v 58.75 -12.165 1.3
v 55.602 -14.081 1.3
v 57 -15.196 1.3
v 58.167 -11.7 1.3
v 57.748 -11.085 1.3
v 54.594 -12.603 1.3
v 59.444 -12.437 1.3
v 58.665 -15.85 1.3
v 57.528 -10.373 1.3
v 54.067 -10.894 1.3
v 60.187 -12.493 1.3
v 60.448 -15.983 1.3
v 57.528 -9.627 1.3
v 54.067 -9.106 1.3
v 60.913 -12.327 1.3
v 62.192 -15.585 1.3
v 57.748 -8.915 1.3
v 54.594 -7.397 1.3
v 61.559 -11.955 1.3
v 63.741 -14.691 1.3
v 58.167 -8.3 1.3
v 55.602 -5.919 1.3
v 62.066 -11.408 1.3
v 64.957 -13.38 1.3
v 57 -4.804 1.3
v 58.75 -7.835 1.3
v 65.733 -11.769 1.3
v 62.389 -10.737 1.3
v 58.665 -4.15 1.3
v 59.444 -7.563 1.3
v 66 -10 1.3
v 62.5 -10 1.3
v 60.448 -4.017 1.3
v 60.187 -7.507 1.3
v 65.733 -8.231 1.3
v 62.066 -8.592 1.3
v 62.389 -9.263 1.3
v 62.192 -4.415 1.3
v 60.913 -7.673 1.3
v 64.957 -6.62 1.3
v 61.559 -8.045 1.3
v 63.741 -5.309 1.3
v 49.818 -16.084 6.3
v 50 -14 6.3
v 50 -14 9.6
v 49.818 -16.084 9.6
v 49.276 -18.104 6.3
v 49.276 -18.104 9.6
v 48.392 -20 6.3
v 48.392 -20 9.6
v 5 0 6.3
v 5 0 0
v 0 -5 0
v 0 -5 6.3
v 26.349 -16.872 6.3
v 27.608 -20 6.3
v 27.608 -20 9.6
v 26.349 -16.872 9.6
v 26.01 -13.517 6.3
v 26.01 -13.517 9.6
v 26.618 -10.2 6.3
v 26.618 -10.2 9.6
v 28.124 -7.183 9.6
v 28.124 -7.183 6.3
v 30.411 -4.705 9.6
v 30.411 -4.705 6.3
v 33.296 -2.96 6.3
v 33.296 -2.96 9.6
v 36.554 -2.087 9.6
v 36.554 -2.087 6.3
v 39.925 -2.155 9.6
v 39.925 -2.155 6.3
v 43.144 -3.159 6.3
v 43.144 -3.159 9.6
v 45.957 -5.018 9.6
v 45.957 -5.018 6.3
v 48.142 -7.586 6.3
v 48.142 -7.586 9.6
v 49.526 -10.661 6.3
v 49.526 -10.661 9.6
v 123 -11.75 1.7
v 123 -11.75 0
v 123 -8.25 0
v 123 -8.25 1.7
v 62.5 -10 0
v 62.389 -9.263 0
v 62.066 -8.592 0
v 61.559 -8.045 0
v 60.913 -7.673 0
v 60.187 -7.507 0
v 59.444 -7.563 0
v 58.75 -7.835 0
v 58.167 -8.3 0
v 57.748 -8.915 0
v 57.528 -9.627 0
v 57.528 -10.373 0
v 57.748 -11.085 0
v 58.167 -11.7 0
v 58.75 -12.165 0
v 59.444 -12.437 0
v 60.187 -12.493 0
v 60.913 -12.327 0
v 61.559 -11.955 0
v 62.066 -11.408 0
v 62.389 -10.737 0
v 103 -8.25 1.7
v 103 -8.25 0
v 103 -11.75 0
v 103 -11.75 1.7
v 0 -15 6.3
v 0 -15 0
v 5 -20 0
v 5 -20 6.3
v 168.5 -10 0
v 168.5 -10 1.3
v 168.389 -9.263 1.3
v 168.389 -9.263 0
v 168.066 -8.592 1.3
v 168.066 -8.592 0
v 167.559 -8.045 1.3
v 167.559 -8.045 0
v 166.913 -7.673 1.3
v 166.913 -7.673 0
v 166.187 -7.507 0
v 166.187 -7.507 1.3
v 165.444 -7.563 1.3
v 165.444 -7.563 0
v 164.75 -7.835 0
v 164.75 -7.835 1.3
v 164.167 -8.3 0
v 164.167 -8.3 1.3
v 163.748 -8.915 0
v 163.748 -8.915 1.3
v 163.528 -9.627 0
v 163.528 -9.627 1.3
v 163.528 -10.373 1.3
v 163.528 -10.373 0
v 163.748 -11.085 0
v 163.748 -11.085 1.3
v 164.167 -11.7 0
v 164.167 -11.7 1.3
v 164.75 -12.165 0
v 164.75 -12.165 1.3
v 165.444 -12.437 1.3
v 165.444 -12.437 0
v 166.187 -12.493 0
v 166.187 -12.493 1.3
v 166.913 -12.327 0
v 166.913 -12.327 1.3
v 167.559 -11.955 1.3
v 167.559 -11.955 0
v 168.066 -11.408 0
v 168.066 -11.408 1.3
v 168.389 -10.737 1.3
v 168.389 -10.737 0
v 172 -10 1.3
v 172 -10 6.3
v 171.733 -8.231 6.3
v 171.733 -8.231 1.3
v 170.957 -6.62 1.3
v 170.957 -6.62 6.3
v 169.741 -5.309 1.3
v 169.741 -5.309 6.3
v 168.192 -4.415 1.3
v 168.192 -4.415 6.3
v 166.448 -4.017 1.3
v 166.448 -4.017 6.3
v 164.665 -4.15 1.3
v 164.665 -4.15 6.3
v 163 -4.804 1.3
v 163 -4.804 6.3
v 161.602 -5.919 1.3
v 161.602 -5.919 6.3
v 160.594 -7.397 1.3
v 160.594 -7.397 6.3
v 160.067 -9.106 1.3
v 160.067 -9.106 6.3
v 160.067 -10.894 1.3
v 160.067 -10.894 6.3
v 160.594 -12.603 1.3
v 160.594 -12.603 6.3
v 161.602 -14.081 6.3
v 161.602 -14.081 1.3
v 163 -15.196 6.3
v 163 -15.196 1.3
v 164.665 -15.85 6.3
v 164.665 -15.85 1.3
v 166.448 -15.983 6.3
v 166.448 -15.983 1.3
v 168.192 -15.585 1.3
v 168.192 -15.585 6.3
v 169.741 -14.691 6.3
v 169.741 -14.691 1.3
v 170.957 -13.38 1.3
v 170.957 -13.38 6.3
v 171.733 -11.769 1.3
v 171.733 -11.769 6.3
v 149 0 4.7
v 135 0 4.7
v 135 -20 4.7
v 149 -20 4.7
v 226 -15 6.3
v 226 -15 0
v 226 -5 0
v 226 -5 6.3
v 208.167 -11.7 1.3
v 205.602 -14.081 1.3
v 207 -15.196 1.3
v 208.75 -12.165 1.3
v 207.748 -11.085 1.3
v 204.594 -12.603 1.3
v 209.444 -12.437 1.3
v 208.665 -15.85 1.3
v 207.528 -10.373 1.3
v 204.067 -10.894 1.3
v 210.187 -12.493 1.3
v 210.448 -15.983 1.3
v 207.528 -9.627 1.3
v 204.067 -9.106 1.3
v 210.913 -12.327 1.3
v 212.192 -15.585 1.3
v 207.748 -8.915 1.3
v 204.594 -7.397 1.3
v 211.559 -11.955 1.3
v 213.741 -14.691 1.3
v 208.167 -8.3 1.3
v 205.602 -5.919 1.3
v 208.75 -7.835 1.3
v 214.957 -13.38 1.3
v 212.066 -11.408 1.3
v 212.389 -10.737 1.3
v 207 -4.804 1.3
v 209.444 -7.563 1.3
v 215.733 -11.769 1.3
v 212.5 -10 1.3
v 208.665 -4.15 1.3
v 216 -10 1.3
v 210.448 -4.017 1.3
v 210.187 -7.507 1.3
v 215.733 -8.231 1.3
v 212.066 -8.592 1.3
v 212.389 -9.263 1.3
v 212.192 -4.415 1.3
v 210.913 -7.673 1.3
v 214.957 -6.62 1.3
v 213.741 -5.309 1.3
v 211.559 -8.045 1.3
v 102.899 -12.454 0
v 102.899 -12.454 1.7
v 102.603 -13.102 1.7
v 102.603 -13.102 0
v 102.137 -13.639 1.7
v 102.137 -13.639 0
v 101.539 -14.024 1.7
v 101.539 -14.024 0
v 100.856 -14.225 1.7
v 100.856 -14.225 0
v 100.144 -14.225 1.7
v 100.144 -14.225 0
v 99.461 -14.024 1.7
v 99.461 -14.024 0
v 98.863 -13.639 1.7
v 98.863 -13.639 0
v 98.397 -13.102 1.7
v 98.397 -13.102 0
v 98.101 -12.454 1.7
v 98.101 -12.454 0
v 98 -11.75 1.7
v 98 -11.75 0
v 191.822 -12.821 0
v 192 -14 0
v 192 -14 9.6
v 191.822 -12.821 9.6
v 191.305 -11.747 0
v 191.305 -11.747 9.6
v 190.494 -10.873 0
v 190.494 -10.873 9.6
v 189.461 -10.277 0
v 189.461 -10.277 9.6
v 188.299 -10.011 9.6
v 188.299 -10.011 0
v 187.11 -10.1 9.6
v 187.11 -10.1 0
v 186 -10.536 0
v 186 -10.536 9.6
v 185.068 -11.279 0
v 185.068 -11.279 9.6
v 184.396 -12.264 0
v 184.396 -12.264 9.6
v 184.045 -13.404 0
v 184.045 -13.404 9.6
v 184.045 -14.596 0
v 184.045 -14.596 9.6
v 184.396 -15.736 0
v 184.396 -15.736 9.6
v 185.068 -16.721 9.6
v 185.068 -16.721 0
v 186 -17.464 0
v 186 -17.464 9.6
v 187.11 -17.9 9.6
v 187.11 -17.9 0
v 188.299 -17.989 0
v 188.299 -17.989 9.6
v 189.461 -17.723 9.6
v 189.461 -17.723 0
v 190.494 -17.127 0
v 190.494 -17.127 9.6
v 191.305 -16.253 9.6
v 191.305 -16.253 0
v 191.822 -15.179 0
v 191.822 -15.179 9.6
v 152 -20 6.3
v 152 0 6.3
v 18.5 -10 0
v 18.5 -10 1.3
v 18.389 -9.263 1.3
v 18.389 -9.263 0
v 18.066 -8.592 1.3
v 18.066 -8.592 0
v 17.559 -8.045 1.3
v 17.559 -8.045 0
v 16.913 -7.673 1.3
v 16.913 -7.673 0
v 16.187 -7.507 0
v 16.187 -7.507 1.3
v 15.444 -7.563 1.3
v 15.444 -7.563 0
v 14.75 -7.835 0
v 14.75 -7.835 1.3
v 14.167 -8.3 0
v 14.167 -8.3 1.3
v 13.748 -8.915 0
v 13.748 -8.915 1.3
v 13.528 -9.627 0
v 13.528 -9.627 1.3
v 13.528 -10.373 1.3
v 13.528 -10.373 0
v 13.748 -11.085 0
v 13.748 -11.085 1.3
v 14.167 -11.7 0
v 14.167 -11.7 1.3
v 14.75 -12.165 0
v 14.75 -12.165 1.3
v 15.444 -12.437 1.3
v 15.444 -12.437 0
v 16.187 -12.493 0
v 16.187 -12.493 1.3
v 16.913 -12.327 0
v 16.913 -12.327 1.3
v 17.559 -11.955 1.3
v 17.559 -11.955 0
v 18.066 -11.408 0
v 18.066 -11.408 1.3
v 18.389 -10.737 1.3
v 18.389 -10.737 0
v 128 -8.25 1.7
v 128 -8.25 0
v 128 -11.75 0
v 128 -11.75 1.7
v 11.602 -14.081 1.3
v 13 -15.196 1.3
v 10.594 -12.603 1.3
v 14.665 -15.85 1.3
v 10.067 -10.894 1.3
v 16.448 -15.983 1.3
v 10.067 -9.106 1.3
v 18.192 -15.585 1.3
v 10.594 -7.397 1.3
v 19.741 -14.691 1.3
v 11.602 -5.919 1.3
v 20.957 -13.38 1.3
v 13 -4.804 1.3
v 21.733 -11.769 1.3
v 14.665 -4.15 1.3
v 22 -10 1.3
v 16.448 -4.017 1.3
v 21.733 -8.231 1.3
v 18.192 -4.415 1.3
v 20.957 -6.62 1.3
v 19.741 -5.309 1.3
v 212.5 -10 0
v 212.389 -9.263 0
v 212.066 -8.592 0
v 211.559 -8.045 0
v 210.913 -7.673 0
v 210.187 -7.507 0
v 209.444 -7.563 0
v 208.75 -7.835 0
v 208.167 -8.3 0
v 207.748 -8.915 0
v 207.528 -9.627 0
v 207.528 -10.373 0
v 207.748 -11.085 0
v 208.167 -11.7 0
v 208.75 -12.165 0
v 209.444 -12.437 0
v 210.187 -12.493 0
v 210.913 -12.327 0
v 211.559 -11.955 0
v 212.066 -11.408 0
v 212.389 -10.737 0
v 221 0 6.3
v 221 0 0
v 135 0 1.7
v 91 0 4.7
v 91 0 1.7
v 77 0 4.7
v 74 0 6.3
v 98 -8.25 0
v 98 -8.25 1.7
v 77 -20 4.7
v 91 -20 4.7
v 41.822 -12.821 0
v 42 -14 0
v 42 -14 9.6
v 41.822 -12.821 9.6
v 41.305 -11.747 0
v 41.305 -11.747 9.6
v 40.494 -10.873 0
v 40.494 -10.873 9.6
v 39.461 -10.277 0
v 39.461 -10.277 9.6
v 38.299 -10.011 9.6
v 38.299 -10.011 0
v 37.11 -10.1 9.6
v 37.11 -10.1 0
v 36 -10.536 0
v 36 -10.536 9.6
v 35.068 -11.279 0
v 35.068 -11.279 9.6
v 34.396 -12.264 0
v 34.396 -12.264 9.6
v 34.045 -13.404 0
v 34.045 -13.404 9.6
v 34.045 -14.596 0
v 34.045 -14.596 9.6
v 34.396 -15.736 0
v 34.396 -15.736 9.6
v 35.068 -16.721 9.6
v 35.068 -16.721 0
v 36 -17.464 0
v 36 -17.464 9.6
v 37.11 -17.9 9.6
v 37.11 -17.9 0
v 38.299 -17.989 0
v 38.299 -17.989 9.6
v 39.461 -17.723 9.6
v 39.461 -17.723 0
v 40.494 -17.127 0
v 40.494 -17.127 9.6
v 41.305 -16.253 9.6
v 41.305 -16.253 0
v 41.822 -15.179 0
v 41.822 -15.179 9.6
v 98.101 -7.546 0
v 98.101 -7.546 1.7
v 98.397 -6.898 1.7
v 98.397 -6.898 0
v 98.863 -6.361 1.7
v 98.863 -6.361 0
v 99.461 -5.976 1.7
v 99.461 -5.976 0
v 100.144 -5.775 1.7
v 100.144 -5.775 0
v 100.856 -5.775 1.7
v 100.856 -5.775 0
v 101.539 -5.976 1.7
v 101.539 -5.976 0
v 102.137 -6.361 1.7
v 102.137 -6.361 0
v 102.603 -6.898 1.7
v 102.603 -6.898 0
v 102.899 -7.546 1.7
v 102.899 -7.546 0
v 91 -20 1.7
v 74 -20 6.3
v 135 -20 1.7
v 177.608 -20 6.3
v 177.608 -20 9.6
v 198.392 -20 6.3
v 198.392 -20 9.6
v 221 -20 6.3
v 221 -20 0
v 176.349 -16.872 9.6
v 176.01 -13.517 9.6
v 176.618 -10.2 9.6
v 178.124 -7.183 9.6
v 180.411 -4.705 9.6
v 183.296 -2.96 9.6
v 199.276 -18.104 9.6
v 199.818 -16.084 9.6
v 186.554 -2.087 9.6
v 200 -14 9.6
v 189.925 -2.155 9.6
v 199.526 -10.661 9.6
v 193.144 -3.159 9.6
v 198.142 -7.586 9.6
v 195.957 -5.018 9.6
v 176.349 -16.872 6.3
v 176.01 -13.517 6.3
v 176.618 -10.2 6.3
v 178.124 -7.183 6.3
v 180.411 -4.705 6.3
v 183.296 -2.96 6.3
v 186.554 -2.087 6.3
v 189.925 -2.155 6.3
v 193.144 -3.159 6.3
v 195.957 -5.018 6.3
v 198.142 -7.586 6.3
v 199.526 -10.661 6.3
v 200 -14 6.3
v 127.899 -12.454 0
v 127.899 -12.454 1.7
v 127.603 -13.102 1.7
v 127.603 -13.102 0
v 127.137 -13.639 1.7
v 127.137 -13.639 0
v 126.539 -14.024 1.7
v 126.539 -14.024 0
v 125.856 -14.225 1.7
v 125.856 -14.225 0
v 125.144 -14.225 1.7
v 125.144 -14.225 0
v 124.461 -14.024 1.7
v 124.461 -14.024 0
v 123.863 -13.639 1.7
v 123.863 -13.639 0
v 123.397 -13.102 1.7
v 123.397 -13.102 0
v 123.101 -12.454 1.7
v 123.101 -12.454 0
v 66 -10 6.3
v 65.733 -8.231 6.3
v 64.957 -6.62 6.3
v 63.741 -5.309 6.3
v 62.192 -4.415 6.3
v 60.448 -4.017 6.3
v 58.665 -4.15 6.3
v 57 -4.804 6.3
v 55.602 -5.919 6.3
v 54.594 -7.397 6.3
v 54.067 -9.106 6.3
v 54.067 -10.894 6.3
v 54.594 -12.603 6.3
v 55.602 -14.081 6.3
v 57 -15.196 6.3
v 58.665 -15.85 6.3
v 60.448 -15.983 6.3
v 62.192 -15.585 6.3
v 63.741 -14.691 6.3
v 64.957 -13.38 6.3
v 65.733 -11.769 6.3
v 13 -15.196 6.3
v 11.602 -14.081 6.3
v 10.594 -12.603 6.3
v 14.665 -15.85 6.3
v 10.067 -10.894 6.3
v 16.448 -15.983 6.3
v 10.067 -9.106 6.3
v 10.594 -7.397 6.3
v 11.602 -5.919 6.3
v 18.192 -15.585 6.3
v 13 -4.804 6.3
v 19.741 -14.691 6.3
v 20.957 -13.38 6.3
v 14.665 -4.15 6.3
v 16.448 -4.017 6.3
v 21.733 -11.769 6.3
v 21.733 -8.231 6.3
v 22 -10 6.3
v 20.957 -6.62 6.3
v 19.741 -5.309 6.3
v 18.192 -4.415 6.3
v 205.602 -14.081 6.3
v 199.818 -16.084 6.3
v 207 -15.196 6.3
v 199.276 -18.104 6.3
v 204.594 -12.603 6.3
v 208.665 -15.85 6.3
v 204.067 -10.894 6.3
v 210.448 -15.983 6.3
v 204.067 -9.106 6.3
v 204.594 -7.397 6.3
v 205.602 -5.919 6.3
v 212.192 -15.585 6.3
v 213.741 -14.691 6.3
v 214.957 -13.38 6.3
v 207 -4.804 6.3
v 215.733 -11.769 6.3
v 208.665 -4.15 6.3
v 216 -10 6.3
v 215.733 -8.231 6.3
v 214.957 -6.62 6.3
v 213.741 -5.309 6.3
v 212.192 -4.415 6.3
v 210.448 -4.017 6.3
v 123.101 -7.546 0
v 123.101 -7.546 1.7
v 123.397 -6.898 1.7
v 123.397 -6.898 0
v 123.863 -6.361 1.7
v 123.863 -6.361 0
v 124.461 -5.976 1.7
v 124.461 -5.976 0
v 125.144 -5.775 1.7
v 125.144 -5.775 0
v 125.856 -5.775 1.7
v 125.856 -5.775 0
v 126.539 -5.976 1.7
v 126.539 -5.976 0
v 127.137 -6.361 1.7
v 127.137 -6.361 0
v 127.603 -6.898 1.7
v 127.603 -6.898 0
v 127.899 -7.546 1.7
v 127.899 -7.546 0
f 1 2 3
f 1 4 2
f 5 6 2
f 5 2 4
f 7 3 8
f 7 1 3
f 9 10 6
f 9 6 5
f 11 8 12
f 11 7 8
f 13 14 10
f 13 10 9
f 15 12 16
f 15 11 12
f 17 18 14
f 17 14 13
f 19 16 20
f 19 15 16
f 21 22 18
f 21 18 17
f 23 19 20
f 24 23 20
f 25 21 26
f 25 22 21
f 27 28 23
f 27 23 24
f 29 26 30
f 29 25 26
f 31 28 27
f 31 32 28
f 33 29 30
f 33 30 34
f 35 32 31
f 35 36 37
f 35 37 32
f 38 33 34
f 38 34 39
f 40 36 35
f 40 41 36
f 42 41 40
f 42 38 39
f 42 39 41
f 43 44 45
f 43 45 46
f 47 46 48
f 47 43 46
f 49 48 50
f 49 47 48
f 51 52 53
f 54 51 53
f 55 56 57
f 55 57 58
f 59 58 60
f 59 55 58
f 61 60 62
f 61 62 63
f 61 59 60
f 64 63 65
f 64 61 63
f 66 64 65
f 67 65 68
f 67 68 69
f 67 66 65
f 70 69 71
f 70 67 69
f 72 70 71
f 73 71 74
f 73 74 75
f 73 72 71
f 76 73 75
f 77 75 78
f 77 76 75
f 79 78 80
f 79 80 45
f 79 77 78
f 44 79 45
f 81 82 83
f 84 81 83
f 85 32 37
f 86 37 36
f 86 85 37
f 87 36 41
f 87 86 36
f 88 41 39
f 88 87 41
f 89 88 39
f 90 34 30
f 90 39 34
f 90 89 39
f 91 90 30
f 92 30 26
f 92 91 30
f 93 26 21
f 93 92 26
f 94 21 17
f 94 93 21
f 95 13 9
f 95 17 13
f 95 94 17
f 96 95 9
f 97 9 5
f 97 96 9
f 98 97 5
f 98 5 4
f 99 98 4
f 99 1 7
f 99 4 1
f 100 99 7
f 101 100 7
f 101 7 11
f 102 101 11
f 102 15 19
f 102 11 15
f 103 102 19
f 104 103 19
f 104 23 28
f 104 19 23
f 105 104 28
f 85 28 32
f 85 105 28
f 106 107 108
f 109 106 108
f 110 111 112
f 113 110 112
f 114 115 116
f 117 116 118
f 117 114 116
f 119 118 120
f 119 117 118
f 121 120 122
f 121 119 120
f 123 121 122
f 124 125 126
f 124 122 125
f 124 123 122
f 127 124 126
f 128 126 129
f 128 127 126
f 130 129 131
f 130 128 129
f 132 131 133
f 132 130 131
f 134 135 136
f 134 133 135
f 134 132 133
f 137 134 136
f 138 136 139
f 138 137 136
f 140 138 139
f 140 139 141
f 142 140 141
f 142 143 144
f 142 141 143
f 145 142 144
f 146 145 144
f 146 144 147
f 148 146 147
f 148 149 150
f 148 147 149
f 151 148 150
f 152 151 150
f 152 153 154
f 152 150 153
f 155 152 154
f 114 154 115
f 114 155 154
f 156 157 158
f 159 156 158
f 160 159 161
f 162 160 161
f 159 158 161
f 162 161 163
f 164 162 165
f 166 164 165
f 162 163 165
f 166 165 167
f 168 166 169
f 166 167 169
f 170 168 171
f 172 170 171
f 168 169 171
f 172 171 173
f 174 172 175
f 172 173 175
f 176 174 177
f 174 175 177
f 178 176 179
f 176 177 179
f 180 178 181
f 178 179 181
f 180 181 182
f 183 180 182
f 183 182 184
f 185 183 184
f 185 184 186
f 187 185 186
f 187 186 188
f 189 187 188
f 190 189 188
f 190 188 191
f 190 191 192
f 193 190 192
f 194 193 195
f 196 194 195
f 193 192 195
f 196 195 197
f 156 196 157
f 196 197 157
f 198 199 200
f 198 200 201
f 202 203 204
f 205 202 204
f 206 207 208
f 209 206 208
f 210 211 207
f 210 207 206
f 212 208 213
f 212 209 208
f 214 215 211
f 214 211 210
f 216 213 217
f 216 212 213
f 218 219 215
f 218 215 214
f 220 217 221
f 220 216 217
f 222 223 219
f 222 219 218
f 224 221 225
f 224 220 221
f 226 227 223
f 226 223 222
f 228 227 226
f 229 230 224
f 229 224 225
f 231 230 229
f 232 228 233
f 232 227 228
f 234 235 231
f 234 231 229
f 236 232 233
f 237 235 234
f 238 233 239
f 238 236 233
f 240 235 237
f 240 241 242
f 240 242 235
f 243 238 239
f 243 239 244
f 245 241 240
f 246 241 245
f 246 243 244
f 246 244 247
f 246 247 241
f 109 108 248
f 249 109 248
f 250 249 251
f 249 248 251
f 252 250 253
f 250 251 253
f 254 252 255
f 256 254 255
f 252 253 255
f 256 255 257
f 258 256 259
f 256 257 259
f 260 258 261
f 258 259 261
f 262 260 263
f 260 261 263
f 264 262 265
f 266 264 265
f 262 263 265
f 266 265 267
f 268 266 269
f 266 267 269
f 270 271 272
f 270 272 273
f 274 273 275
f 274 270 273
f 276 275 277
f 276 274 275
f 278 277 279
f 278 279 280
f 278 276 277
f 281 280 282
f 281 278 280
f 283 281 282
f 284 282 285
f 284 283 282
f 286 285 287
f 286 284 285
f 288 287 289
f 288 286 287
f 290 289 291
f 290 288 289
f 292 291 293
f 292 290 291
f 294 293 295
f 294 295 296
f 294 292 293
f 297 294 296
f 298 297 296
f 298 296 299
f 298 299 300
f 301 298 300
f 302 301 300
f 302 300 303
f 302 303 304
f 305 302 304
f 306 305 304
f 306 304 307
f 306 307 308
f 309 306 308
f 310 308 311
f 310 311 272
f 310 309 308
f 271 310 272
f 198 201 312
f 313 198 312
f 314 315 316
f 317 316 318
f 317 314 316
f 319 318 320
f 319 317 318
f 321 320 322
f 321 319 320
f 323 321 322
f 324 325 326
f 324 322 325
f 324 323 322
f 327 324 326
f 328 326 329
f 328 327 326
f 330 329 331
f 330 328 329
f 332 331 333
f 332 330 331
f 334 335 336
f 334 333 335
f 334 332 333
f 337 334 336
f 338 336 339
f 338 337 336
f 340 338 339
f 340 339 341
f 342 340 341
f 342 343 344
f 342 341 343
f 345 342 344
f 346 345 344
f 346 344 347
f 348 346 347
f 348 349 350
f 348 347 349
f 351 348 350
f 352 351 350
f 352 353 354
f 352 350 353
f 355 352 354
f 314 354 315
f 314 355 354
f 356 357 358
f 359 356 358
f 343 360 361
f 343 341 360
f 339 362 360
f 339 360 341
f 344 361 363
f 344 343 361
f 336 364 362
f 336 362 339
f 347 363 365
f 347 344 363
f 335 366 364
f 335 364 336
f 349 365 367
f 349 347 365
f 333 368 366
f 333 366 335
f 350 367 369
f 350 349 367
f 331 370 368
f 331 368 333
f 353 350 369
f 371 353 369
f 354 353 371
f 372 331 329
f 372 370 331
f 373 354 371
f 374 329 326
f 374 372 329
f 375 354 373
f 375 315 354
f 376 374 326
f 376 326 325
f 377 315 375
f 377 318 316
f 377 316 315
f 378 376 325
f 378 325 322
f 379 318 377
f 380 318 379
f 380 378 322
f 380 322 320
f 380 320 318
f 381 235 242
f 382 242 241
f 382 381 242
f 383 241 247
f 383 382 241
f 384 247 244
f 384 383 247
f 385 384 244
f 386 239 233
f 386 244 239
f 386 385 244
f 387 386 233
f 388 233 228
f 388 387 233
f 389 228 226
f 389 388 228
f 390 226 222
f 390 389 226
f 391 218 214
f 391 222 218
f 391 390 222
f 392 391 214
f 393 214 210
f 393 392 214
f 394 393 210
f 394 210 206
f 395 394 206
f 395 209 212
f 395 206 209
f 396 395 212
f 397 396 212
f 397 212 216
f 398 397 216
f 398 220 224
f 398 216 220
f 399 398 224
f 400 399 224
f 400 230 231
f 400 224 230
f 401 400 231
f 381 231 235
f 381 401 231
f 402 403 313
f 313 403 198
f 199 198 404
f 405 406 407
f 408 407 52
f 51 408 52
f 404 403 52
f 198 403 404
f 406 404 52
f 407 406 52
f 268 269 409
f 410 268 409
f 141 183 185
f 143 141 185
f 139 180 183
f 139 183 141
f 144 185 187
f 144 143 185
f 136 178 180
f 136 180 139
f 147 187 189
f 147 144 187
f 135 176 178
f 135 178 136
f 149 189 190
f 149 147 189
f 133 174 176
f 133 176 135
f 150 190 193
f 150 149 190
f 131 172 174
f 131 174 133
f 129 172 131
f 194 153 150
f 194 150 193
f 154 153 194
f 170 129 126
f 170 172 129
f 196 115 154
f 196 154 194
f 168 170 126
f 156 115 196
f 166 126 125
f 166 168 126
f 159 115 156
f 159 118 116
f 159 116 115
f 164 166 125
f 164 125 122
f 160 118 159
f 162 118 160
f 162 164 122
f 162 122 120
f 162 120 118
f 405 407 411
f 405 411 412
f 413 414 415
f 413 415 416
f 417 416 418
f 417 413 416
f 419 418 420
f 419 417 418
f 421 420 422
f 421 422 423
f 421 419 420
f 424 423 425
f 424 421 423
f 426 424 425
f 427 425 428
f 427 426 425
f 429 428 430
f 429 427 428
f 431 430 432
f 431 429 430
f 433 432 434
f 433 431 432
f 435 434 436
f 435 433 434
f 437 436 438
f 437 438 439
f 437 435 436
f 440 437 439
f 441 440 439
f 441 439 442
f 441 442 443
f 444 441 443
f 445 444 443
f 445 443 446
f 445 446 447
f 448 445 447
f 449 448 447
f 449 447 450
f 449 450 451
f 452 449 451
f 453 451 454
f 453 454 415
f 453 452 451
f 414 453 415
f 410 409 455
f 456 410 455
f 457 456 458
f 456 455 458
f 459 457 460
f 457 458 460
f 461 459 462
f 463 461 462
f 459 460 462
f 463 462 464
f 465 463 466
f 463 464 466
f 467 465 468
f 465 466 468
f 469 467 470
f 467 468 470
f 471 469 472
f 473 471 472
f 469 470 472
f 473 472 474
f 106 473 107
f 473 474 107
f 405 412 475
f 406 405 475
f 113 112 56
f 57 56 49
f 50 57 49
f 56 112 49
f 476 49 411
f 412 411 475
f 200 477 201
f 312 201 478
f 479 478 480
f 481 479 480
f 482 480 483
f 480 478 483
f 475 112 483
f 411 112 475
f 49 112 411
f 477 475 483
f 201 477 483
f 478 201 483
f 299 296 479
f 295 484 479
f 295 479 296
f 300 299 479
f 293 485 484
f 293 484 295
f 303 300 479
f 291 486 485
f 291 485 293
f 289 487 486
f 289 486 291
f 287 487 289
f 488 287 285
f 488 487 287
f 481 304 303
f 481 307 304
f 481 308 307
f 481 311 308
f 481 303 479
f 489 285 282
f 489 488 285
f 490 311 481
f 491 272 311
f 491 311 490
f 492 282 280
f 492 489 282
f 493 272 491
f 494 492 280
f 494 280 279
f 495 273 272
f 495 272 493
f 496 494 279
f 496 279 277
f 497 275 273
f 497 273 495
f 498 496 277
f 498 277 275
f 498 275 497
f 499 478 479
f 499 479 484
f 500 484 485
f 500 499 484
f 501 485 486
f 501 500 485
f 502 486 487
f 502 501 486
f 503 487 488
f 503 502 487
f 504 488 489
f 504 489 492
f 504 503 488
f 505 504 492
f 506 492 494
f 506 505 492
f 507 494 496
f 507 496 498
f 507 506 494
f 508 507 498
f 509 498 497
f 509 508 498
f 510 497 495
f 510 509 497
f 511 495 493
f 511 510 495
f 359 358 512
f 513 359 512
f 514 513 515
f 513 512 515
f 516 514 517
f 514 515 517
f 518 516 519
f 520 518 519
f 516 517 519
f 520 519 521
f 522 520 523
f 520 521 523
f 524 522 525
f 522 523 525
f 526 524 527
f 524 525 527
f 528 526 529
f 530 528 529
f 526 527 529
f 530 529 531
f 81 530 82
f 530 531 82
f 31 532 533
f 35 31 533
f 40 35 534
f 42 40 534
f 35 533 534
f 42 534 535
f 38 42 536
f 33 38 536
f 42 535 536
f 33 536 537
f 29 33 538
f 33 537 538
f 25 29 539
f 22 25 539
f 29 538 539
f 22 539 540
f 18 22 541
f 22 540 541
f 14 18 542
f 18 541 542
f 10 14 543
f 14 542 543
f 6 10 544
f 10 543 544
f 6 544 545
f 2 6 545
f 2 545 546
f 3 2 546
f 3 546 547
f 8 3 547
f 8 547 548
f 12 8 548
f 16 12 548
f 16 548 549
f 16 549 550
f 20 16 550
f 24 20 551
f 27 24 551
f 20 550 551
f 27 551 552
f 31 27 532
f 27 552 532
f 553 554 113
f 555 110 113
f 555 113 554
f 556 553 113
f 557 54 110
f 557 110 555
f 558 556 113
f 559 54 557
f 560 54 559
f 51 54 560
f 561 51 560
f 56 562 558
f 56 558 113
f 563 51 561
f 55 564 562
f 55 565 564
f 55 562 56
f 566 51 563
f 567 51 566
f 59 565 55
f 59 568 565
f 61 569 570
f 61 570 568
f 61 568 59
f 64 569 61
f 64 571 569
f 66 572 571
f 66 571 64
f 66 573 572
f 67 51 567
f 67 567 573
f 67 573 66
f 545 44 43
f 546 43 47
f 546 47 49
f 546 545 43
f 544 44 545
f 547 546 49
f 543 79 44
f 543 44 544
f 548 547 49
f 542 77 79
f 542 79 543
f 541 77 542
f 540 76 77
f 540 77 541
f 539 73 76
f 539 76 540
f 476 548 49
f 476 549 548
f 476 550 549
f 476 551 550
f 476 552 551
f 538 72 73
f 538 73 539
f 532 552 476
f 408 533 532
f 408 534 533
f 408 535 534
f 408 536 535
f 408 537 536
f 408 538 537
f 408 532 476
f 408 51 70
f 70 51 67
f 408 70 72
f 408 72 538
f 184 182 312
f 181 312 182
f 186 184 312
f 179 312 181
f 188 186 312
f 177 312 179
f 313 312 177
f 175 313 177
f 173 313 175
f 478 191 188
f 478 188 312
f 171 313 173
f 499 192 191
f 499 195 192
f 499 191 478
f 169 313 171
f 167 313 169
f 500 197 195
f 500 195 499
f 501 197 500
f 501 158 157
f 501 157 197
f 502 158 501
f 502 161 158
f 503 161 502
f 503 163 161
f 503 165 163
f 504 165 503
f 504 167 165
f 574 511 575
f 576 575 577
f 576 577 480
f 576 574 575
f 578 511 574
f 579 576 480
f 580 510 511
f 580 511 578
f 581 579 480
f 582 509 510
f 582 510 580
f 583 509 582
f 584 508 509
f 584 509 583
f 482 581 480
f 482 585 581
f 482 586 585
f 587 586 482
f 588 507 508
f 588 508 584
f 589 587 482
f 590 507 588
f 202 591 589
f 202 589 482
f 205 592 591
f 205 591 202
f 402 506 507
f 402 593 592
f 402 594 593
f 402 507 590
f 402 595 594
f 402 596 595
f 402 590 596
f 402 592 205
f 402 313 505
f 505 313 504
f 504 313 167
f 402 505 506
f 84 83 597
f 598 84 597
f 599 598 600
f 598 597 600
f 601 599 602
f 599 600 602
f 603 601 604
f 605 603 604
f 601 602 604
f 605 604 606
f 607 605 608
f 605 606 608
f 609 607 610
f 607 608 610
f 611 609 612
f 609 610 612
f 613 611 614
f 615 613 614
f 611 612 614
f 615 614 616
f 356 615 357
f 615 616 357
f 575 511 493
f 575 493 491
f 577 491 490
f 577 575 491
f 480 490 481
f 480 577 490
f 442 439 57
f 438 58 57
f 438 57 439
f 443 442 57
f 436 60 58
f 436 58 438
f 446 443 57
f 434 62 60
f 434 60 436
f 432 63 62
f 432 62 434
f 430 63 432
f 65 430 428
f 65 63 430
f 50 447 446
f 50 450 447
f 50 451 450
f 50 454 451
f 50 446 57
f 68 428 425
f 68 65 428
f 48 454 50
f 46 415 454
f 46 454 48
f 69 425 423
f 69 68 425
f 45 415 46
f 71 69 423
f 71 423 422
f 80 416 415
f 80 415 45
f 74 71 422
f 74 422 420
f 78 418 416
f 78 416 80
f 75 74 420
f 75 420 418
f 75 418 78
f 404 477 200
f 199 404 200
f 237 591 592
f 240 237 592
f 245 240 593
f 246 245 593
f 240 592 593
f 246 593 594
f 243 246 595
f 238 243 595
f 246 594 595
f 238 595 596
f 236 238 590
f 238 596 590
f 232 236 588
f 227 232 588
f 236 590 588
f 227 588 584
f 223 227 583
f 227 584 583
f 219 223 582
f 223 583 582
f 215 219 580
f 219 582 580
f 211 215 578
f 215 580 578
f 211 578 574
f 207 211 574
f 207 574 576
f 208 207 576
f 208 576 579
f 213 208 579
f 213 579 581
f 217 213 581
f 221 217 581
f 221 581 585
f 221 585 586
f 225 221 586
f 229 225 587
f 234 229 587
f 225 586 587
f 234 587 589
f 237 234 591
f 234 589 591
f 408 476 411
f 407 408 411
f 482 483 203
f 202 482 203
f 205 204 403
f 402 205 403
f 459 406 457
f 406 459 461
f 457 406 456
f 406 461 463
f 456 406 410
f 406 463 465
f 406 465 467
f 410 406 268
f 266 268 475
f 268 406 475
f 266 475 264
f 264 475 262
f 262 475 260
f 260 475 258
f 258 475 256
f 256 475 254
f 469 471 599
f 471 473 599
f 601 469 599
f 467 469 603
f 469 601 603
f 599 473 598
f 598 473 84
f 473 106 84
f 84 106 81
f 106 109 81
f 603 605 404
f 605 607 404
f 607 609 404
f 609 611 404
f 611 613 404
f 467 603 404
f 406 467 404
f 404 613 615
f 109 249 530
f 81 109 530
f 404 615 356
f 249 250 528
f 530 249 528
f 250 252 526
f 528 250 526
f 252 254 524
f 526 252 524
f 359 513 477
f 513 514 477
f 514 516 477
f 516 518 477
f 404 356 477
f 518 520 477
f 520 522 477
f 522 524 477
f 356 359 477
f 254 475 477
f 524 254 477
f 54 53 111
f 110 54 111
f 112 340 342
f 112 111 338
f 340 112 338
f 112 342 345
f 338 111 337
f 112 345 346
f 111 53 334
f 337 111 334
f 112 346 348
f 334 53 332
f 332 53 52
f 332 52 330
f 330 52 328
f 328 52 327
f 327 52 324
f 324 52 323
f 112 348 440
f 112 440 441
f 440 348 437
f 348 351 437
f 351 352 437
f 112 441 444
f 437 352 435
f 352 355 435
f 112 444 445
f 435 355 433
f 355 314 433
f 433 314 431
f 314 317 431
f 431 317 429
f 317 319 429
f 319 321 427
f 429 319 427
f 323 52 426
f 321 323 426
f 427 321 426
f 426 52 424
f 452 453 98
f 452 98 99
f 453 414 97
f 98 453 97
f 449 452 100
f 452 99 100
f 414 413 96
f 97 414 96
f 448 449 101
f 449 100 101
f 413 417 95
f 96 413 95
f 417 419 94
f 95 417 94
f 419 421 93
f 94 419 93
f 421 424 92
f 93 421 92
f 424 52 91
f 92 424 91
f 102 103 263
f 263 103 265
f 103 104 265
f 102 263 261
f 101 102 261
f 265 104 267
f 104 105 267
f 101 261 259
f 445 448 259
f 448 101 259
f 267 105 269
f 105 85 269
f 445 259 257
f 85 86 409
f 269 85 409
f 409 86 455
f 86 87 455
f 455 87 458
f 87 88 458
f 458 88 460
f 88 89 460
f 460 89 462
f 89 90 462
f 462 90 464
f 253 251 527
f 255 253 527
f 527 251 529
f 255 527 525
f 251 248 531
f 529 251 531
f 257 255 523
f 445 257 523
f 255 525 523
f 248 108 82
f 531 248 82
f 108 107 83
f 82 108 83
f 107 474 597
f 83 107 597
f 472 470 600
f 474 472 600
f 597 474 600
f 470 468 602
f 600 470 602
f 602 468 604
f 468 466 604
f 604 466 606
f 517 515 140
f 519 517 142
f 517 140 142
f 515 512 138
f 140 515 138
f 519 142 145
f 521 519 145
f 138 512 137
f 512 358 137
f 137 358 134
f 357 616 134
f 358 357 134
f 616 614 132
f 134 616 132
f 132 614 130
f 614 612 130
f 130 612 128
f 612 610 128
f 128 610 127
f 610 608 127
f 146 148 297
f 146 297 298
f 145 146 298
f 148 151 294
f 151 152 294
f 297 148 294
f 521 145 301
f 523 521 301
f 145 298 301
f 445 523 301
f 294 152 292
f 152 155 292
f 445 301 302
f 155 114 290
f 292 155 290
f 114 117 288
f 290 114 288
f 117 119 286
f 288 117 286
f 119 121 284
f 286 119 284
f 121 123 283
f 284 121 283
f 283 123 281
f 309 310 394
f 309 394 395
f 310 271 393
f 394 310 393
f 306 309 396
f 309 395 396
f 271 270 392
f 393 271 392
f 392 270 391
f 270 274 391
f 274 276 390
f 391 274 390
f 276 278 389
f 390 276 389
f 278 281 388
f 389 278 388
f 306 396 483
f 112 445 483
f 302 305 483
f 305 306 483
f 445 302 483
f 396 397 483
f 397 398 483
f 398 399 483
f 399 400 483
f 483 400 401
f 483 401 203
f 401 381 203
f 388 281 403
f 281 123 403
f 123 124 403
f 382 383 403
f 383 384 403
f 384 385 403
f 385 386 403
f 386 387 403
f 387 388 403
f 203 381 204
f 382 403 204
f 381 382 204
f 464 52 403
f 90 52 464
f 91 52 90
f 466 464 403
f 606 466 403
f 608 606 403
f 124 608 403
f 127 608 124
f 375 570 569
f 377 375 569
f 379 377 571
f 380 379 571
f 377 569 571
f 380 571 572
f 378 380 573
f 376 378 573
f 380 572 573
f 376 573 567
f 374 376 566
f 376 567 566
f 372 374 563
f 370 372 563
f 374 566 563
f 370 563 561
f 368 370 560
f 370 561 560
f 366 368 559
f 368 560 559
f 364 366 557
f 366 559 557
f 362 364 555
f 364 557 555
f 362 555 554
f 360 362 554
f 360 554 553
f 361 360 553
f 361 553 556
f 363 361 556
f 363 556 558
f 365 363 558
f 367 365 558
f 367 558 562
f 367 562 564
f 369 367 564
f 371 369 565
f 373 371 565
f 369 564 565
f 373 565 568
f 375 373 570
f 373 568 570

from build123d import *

# Parameters (mm, degrees)
SKETCH1_R           = 4
SKETCH1_R_2         = 2.5
BOSS_EXTRUDE1_DEPTH = 9.6
CUT_EXTRUDE1_START  = -3.3
SKETCH2_R           = 2.5
CUT_EXTRUDE1_DEPTH  = 3.3
CUT_EXTRUDE2_DEPTH  = 228.086239125
SKETCH5_R           = 6
CUT_EXTRUDE3_DEPTH  = 5


with BuildPart() as part:
    # Sketch1 → Boss-Extrude1 (new body)
    with BuildSketch(Plane.XY):
        Polygon((221, 0), (5, 0), (0, -5), (0, -15), (5, -20), (221, -20), (226, -15), (226, -5), align=None)
        with Locations((38, -14)):
            Circle(SKETCH1_R, mode=Mode.SUBTRACT)
        with Locations((188, -14)):
            Circle(SKETCH1_R, mode=Mode.SUBTRACT)
        with Locations((16, -10)):
            Circle(SKETCH1_R_2, mode=Mode.SUBTRACT)
        with Locations((60, -10)):
            Circle(SKETCH1_R_2, mode=Mode.SUBTRACT)
        with BuildLine():
            ThreePointArc((98, -8.25), (100.5, -5.75), (103, -8.25))
            Line((103, -8.25), (103, -11.75))
            ThreePointArc((103, -11.75), (100.5, -14.25), (98, -11.75))
            Line((98, -11.75), (98, -8.25))
        make_face(mode=Mode.SUBTRACT)
        with BuildLine():
            Line((128, -8.25), (128, -11.75))
            ThreePointArc((128, -11.75), (125.5, -14.25), (123, -11.75))
            Line((123, -11.75), (123, -8.25))
            ThreePointArc((123, -8.25), (125.5, -5.75), (128, -8.25))
        make_face(mode=Mode.SUBTRACT)
        with Locations((166, -10)):
            Circle(SKETCH1_R_2, mode=Mode.SUBTRACT)
        with Locations((210, -10)):
            Circle(SKETCH1_R_2, mode=Mode.SUBTRACT)
    extrude(amount=BOSS_EXTRUDE1_DEPTH)

    # Sketch2 → Cut-Extrude1 (cut)
    # profile 1 of 2: a face of its own
    with BuildSketch(Plane.XY.offset(9.6).offset(CUT_EXTRUDE1_START)):
        with BuildLine():
            Line((48.392304845, -20), (113, -20))
            Line((113, -20), (113, 0))
            Line((113, 0), (5, 0))
            Line((5, 0), (0, -5))
            Line((0, -5), (0, -15))
            Line((0, -15), (5, -20))
            Line((5, -20), (27.607695155, -20))
            ThreePointArc((27.607695155, -20), (34.894171459, -2.408890085), (50, -14))
            ThreePointArc((50, -14), (49.591109915, -17.105828541), (48.392304845, -20))
        make_face()
        with Locations((16, -10)):
            Circle(SKETCH2_R, mode=Mode.SUBTRACT)
        with Locations((60, -10)):
            Circle(SKETCH2_R, mode=Mode.SUBTRACT)
        with BuildLine():
            Line((98, -11.75), (98, -8.25))
            ThreePointArc((98, -8.25), (100.5, -5.75), (103, -8.25))
            Line((103, -8.25), (103, -11.75))
            ThreePointArc((103, -11.75), (100.5, -14.25), (98, -11.75))
        make_face(mode=Mode.SUBTRACT)
    # profile 2 of 2: a face of its own
    with BuildSketch(Plane.XY.offset(9.6).offset(CUT_EXTRUDE1_START)):
        with BuildLine():
            Line((113, 0), (113, -20))
            Line((113, -20), (177.607695155, -20))
            ThreePointArc((177.607695155, -20), (184.894171459, -2.408890085), (200, -14))
            ThreePointArc((200, -14), (199.591109915, -17.105828541), (198.392304845, -20))
            Line((198.392304845, -20), (221, -20))
            Line((221, -20), (226, -15))
            Line((226, -15), (226, -5))
            Line((226, -5), (221, 0))
            Line((221, 0), (113, 0))
        make_face()
        with BuildLine():
            Line((123, -11.75), (123, -8.25))
            ThreePointArc((123, -8.25), (125.5, -5.75), (128, -8.25))
            Line((128, -8.25), (128, -11.75))
            ThreePointArc((128, -11.75), (125.5, -14.25), (123, -11.75))
        make_face(mode=Mode.SUBTRACT)
        with Locations((166, -10)):
            Circle(SKETCH2_R, mode=Mode.SUBTRACT)
        with Locations((210, -10)):
            Circle(SKETCH2_R, mode=Mode.SUBTRACT)
    extrude(amount=CUT_EXTRUDE1_DEPTH, mode=Mode.SUBTRACT)

    # Sketch4 → Cut-Extrude2 (cut, through all)
    with BuildSketch(Plane.XZ.offset(20)):
        Polygon((149, 4.7), (152, 6.3), (113, 6.3), (74, 6.3), (77, 4.7), (91, 4.7), (91, 1.7), (135, 1.7), (135, 4.7), align=None)
    extrude(amount=-CUT_EXTRUDE2_DEPTH, mode=Mode.SUBTRACT)

    # Sketch5 → Cut-Extrude3 (cut)
    with BuildSketch(Plane.XY.offset(6.3)):
        with Locations((16, -10)):
            Circle(SKETCH5_R)
        with Locations((60, -10)):
            Circle(SKETCH5_R)
        with Locations((166, -10)):
            Circle(SKETCH5_R)
        with Locations((210, -10)):
            Circle(SKETCH5_R)
    extrude(amount=-CUT_EXTRUDE3_DEPTH, mode=Mode.SUBTRACT)


solid = part.part
